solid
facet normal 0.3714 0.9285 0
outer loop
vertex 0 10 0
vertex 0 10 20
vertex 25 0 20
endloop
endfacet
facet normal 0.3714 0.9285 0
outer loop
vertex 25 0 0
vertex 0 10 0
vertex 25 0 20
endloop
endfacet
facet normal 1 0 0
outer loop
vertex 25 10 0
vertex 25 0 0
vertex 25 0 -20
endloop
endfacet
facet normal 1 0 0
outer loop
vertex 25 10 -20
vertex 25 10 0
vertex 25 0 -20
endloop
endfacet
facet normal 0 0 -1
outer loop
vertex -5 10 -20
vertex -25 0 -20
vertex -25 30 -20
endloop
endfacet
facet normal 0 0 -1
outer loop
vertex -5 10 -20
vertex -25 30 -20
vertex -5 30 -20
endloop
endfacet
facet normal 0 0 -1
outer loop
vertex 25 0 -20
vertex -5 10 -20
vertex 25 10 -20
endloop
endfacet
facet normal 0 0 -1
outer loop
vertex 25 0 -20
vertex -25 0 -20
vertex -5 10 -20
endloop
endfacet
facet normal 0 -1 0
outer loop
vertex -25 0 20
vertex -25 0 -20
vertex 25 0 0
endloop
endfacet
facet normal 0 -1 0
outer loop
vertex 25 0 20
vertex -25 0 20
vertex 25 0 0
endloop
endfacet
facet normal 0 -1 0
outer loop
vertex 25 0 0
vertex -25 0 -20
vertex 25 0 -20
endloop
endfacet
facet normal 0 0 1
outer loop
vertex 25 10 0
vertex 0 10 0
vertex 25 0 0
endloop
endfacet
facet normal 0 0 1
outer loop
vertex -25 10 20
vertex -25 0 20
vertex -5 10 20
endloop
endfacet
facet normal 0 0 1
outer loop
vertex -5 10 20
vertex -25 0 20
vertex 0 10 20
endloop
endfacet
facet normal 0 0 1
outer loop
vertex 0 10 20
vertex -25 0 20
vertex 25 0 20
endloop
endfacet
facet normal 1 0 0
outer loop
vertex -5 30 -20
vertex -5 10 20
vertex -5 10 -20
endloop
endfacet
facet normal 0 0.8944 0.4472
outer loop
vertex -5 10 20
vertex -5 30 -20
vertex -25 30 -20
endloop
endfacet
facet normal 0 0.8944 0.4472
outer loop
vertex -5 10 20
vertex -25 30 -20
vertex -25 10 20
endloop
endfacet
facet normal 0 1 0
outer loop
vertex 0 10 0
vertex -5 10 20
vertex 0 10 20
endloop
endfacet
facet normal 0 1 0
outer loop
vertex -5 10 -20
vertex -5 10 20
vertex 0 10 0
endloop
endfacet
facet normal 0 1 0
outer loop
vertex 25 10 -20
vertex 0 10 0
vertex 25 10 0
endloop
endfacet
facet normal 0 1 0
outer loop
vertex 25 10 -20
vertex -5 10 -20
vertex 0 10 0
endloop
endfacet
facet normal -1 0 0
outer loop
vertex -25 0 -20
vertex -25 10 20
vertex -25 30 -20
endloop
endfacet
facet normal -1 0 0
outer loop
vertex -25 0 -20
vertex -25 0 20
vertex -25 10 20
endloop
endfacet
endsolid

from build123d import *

# Parameters (mm, degrees)
SKETCH1_W           = 50
SKETCH1_H           = 40
BOSS_EXTRUDE1_DEPTH = 10
SKETCH2_W           = 20
SKETCH2_H           = 40
BOSS_EXTRUDE2_DEPTH = 20
CUT_EXTRUDE1_DEPTH  = 20
CUT_EXTRUDE5_DEPTH  = 20


with BuildPart() as part:
    # Sketch1 → Boss-Extrude1 (new body)
    with BuildSketch(Plane(origin=(0, 0, 0), x_dir=(1, 0, 0), z_dir=(0, 1, 0))):
        Rectangle(SKETCH1_W, SKETCH1_H)
    extrude(amount=BOSS_EXTRUDE1_DEPTH)

    # Sketch2 → Boss-Extrude2 (add)
    with BuildSketch(Plane(origin=(0, 10, 0), x_dir=(1, 0, 0), z_dir=(0, 1, 0))):
        with Locations((-15, 0)):
            Rectangle(SKETCH2_W, SKETCH2_H)
    extrude(amount=BOSS_EXTRUDE2_DEPTH)

    # Sketch3 → Cut-Extrude1 (cut)
    with BuildSketch(Plane(origin=(-5, 0, 0), x_dir=(0, 0, -1), z_dir=(1, 0, 0))):
        Polygon((20, 30), (-20, 10), (-20, 30), align=None)
    extrude(amount=-CUT_EXTRUDE1_DEPTH, mode=Mode.SUBTRACT)

    # Sketch5 → Cut-Extrude5 (cut)
    with BuildSketch(Plane.XY.offset(20)):
        Polygon((0, 10), (25, 0), (25, 10), align=None)
    extrude(amount=-CUT_EXTRUDE5_DEPTH, mode=Mode.SUBTRACT)


solid = part.part
